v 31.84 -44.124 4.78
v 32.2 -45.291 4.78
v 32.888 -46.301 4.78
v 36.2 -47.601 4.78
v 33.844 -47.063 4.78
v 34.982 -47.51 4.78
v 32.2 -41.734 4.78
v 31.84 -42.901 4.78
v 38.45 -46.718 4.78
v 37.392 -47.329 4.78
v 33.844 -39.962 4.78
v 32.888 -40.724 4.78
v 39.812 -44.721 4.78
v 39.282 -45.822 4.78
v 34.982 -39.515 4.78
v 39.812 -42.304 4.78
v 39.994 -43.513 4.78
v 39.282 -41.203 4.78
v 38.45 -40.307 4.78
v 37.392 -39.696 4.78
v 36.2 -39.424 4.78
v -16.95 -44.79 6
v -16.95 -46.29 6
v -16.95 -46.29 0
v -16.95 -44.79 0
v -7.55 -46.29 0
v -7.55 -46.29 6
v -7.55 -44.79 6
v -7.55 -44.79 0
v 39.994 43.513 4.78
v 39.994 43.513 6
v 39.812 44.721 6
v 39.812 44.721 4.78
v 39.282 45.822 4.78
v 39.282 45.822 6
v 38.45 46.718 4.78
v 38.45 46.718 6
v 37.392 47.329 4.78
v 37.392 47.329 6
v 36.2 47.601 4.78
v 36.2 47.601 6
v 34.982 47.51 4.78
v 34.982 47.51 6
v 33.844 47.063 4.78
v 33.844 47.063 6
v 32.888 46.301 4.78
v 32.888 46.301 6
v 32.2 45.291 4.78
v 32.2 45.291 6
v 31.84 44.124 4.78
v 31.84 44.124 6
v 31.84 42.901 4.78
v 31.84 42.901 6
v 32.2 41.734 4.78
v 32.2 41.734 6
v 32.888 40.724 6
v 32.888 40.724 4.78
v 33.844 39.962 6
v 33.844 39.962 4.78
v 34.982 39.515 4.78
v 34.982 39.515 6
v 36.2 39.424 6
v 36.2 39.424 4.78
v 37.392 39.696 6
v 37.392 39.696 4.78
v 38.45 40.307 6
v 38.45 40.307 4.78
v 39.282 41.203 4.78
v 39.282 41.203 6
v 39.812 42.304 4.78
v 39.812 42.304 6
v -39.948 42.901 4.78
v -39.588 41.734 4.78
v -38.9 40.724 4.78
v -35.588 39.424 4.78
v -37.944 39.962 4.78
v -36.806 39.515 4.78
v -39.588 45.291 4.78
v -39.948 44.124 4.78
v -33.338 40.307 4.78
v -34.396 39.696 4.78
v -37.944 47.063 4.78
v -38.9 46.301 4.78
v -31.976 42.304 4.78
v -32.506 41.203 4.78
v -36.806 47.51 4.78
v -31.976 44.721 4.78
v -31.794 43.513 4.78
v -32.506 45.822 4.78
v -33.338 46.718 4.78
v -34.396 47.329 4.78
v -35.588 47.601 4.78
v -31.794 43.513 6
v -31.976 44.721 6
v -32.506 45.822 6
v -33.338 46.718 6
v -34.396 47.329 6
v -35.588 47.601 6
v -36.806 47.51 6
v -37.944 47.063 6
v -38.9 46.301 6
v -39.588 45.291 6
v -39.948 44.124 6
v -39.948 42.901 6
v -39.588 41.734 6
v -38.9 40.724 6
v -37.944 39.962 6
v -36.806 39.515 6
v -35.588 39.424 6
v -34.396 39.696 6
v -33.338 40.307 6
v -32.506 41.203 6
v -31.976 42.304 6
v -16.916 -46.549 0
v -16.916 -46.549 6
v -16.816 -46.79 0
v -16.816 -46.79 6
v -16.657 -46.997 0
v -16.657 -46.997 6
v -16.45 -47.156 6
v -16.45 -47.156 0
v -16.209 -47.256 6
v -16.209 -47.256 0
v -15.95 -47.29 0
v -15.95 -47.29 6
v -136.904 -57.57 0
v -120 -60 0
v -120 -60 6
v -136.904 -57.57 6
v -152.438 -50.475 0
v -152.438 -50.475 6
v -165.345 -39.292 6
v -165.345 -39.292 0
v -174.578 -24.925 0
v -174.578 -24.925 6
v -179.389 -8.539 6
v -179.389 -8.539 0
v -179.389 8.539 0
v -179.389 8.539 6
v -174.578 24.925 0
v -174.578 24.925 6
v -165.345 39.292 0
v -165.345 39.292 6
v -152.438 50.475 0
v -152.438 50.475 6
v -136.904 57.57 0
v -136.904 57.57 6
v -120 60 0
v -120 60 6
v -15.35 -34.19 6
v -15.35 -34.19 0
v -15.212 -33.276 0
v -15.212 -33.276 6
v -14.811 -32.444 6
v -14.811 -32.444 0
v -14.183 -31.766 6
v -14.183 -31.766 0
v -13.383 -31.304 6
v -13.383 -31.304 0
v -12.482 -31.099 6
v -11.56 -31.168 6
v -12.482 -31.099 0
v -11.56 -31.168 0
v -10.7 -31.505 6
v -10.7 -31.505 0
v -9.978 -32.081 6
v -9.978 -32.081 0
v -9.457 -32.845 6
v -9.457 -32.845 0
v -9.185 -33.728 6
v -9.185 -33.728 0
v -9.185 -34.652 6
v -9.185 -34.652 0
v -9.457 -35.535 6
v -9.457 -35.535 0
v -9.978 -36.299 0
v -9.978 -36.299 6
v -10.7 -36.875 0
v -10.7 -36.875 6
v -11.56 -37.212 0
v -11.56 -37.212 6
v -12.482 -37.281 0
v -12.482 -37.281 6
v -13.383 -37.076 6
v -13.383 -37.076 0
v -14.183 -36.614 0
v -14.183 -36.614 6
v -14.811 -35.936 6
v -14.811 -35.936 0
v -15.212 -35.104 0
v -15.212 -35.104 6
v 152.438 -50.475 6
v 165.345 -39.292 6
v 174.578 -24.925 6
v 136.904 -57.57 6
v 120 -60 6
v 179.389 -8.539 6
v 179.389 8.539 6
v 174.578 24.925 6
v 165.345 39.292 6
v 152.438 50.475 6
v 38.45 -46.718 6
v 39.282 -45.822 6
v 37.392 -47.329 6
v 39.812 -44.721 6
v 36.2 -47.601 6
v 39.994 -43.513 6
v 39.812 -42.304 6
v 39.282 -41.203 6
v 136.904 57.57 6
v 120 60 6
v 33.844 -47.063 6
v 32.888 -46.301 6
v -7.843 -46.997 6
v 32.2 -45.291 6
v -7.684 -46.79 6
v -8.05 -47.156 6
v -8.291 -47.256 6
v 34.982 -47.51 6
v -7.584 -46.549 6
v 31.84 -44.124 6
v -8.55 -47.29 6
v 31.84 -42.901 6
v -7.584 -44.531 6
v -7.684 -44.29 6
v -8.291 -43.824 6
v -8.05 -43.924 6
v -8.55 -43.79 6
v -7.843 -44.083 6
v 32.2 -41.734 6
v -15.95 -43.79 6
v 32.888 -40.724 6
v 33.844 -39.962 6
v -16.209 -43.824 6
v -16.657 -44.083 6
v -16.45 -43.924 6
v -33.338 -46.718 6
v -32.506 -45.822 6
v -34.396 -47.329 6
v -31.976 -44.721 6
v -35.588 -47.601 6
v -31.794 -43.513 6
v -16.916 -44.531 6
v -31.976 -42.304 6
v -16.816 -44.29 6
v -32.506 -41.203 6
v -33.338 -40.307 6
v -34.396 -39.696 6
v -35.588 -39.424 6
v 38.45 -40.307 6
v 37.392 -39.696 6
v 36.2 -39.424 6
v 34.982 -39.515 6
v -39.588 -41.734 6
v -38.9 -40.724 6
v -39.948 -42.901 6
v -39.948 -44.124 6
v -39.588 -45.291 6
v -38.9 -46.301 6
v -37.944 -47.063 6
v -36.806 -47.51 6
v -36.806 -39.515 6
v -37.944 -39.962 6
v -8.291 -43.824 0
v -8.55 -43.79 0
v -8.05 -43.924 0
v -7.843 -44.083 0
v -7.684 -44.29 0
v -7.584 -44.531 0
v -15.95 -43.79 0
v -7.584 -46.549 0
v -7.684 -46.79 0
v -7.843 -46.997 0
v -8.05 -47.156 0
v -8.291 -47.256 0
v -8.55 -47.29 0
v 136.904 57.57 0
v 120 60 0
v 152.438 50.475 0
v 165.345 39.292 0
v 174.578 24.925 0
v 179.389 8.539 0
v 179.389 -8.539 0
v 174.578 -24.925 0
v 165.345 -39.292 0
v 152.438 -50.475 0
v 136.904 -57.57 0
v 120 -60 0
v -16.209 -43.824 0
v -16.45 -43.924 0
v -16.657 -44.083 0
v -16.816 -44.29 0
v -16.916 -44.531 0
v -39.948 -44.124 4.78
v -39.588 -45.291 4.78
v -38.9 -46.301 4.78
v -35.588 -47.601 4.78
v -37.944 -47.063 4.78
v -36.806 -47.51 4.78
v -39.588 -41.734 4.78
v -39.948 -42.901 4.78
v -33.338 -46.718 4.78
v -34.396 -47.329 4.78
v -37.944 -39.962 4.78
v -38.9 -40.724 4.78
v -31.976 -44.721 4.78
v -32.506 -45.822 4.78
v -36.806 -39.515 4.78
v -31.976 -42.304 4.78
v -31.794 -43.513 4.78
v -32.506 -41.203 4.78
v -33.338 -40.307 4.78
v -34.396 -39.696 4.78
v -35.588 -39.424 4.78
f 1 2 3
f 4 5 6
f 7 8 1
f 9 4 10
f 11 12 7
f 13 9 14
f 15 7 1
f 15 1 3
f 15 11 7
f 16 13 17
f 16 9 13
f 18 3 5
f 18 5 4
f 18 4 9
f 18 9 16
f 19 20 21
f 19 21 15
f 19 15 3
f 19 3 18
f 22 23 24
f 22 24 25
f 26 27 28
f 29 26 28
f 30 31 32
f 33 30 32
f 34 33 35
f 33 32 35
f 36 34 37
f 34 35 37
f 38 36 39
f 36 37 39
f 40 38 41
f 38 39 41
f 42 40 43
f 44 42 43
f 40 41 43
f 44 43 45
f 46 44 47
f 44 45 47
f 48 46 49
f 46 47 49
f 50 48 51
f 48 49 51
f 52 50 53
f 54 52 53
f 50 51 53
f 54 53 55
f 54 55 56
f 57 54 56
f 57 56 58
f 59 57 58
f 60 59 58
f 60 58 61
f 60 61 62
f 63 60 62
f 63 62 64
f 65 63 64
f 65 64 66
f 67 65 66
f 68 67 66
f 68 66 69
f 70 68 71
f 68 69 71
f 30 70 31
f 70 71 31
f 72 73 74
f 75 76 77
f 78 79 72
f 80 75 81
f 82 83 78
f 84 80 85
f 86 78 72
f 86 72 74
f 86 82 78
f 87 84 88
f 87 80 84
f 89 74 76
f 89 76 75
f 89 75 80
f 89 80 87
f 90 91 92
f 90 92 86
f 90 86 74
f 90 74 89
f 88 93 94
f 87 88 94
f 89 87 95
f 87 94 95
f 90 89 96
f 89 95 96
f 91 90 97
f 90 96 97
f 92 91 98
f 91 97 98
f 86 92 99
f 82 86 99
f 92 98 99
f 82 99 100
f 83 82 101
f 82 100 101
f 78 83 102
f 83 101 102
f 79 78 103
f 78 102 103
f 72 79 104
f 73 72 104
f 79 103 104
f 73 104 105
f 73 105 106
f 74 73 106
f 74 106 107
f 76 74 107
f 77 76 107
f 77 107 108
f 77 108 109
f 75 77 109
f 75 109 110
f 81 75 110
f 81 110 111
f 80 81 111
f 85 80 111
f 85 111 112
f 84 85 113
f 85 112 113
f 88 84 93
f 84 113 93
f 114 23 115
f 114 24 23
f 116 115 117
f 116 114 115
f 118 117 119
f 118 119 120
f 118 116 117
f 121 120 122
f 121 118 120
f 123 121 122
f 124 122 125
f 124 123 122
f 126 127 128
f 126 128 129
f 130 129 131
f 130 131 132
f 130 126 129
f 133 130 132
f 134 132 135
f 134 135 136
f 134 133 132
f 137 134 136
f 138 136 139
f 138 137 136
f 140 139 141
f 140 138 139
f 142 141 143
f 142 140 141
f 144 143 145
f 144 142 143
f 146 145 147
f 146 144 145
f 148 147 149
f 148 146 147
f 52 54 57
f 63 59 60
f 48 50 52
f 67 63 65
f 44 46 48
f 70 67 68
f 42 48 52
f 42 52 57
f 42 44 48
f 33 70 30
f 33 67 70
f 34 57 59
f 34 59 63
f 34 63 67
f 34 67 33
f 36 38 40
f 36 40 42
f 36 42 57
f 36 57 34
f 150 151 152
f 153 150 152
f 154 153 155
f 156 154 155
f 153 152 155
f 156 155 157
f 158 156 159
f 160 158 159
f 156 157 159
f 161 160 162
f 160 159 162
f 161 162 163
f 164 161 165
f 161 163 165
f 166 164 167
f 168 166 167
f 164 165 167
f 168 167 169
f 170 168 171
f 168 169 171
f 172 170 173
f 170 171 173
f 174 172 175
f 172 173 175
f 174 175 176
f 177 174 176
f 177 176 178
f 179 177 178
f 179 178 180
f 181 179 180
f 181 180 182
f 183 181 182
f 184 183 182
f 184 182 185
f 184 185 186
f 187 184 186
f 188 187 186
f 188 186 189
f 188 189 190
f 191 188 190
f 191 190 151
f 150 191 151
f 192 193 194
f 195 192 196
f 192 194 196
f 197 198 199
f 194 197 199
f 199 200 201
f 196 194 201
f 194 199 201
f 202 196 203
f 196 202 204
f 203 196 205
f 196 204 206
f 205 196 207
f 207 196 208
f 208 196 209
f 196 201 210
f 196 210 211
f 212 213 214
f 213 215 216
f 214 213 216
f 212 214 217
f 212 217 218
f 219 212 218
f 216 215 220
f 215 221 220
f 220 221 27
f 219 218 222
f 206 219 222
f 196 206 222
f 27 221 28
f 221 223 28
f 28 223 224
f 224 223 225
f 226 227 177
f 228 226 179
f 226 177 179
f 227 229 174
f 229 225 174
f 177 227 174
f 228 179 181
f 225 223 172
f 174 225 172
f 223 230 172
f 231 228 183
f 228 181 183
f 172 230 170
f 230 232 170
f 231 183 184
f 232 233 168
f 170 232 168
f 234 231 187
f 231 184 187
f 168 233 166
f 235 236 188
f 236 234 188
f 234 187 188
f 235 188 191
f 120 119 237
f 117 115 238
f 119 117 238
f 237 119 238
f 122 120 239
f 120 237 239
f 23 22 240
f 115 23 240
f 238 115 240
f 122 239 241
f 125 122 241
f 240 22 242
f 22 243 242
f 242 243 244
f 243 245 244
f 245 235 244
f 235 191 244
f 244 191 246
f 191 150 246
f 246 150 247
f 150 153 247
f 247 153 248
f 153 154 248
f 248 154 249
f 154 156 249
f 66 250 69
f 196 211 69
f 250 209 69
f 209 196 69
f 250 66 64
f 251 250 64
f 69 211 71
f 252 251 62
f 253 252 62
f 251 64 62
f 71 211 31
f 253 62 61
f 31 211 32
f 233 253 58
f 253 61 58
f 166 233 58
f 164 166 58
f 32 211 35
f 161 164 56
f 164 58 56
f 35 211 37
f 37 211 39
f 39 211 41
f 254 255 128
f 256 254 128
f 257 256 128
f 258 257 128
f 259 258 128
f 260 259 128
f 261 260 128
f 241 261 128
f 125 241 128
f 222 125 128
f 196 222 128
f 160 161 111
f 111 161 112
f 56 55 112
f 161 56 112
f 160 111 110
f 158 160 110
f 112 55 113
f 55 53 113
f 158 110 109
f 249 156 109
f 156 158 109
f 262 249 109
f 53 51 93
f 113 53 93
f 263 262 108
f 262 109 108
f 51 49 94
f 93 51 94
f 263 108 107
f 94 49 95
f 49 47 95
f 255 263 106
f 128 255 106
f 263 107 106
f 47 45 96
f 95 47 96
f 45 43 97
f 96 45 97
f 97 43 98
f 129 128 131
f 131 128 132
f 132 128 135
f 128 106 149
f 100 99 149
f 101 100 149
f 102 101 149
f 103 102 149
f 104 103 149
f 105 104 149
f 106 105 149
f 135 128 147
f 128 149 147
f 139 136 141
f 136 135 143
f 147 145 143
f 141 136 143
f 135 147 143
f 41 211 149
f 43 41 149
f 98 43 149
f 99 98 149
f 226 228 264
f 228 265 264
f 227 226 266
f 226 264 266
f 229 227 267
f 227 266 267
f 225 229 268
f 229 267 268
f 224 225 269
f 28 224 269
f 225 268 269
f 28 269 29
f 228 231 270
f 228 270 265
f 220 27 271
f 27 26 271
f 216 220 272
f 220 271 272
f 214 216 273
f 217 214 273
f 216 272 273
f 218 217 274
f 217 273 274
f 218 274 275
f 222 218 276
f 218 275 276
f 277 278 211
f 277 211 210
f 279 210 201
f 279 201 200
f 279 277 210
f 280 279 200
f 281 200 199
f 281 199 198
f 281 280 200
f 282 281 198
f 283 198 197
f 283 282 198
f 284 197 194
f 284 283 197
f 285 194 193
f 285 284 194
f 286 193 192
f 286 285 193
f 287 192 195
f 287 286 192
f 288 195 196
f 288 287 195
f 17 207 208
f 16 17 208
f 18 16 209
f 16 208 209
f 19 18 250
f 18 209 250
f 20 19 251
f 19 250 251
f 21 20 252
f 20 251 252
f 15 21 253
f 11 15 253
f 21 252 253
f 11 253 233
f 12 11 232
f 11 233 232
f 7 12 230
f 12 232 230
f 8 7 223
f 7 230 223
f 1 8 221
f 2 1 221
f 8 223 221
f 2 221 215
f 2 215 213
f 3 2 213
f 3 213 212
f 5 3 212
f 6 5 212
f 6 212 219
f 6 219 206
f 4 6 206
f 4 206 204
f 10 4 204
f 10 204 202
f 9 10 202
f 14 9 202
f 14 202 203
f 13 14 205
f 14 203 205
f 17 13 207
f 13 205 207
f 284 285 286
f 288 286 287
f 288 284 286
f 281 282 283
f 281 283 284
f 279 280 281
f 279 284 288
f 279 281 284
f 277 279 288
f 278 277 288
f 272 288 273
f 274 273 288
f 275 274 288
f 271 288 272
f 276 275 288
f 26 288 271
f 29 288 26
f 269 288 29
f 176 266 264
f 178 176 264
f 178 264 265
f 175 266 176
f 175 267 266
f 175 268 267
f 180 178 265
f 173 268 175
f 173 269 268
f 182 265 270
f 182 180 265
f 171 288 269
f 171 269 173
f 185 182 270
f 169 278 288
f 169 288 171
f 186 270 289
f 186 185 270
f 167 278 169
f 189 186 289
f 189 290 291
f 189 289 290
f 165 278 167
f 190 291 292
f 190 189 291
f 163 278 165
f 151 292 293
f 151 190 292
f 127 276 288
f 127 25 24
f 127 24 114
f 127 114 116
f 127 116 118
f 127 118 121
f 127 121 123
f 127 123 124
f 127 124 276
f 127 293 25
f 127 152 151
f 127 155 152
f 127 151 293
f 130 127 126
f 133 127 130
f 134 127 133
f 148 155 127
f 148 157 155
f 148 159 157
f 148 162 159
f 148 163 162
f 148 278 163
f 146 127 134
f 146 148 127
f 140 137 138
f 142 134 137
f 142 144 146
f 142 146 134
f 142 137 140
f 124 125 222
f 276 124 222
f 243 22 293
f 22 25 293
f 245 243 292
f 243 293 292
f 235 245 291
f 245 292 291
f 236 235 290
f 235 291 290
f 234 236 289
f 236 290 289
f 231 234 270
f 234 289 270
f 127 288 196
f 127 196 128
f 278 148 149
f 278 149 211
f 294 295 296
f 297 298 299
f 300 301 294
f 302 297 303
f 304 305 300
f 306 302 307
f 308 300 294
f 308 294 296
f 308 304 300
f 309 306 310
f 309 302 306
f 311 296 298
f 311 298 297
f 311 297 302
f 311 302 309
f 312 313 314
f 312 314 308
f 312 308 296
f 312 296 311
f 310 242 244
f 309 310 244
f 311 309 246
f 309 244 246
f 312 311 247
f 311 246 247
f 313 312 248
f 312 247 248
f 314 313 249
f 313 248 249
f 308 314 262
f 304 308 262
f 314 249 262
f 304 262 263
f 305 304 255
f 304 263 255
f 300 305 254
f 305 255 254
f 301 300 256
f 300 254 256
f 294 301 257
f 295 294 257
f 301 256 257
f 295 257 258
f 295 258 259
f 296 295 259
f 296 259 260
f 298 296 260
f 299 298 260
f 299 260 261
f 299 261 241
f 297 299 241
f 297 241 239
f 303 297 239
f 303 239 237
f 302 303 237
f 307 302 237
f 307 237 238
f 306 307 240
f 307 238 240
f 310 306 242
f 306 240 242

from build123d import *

# Parameters (mm, degrees)
BOSS_EXTRU_1_DEPTH      = 6
ESQUISSE2_R             = 4.1
ENL_V_MAT_EXTRU_1_DEPTH = 1.22
ENL_V_MAT_EXTRU_2_REACH = 191.832
ESQUISSE3_R             = 3.1
ENL_V_MAT_EXTRU_3_REACH = 191.832
ESQUISSE5_W             = 9.4
ESQUISSE5_H             = 3.5
CONG_1_R                = 1


with BuildPart() as part:
    # Esquisse1 → Boss.-Extru.1 (new body)
    with BuildSketch(Plane.XY):
        with BuildLine():
            Line((120, -60), (-120, -60))
            ThreePointArc((-120, -60), (-180, 0), (-120, 60))
            Line((-120, 60), (120, 60))
            ThreePointArc((120, 60), (180, 0), (120, -60))
        make_face()
    extrude(amount=BOSS_EXTRU_1_DEPTH)

    # Esquisse2 → Enlèv. mat.-Extru.1 (cut)
    with BuildSketch(Plane.XY.offset(6)):
        with Locations((-35.893989476, 43.512538926)):
            Circle(ESQUISSE2_R)
        with Locations((35.893989476, 43.512538926)):
            Circle(ESQUISSE2_R)
        with Locations((35.893989476, -43.512538926)):
            Circle(ESQUISSE2_R)
        with Locations((-35.893989476, -43.512538926)):
            Circle(ESQUISSE2_R)
    extrude(amount=-ENL_V_MAT_EXTRU_1_DEPTH, mode=Mode.SUBTRACT)

    # Esquisse3 → Enlèv. mat.-Extru.2 (cut, up to next)
    with BuildSketch(Plane(origin=(0, 0, 0), x_dir=(-1, 0, 0), z_dir=(0, 0, -1)), mode=Mode.PRIVATE) as enl_v_mat_extru_2_sk1:
        with Locations((12.25, -34.19)):
            Circle(ESQUISSE3_R)
    enl_v_mat_extru_2_tool1 = extrude(enl_v_mat_extru_2_sk1.sketch, amount=-ENL_V_MAT_EXTRU_2_REACH, mode=Mode.PRIVATE) & part.part
    add(enl_v_mat_extru_2_tool1.solids().sort_by_distance((-12.25, -34.19, 0))[0], mode=Mode.SUBTRACT)

    # Esquisse5 → Enlèv. mat.-Extru.3 (cut, up to next)
    with BuildSketch(Plane.XY.offset(6), mode=Mode.PRIVATE) as enl_v_mat_extru_3_sk1:
        with Locations((-12.25, -45.54)):
            Rectangle(ESQUISSE5_W, ESQUISSE5_H)
    enl_v_mat_extru_3_tool1 = extrude(enl_v_mat_extru_3_sk1.sketch, amount=-ENL_V_MAT_EXTRU_3_REACH, mode=Mode.PRIVATE) & part.part
    add(enl_v_mat_extru_3_tool1.solids().sort_by_distance((-12.25, -45.54, 6))[0], mode=Mode.SUBTRACT)

    # Congé1
    cong_1_edges = [part.edges().sort_by_distance(p)[0] for p in [
        (-7.55, -43.79, 3),
        (-7.55, -47.29, 3),
        (-16.95, -47.29, 3),
        (-16.95, -43.79, 3),
    ]]
    fillet(cong_1_edges, radius=CONG_1_R)


solid = part.part
